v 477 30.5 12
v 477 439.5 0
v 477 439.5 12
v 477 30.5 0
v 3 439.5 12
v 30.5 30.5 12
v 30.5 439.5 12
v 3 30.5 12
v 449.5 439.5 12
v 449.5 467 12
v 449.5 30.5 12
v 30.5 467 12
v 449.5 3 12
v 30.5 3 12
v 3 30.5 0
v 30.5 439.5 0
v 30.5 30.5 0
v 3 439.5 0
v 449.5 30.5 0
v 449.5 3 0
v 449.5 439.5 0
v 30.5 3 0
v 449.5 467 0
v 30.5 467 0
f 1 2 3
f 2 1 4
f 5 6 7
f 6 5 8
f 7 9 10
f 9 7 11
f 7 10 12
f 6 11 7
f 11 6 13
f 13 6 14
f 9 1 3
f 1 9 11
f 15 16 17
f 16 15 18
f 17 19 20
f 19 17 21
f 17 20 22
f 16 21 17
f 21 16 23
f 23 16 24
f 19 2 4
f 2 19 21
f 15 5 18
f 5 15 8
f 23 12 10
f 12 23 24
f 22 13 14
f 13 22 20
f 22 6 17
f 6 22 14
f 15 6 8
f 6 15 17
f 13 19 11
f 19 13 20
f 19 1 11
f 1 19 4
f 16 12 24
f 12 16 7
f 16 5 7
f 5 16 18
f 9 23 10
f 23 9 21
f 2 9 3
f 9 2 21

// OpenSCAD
// file: ../imports/Chamfer.scad
/**
  *  The MIT License (MIT)
  *
  *  "Chamfers for OpenSCAD" v0.4 Copyright (c) 2016 SebiTimeWaster
  *
  *  Permission is hereby granted, free of charge, to any person obtaining a copy
  *  of this software and associated documentation files (the "Software"), to deal
  *  in the Software without restriction, including without limitation the rights
  *  to use, copy, modify, merge, publish, distribute, sublicense, and/or sell
  *  copies of the Software, and to permit persons to whom the Software is
  *  furnished to do so, subject to the following conditions:
  *
  *  The above copyright notice and this permission notice shall be included in all
  *  copies or substantial portions of the Software.
  *
  *  THE SOFTWARE IS PROVIDED "AS IS", WITHOUT WARRANTY OF ANY KIND, EXPRESS OR
  *  IMPLIED, INCLUDING BUT NOT LIMITED TO THE WARRANTIES OF MERCHANTABILITY,
  *  FITNESS FOR A PARTICULAR PURPOSE AND NONINFRINGEMENT. IN NO EVENT SHALL THE
  *  AUTHORS OR COPYRIGHT HOLDERS BE LIABLE FOR ANY CLAIM, DAMAGES OR OTHER
  *  LIABILITY, WHETHER IN AN ACTION OF CONTRACT, TORT OR OTHERWISE, ARISING FROM,
  *  OUT OF OR IN CONNECTION WITH THE SOFTWARE OR THE USE OR OTHER DEALINGS IN THE
  *  SOFTWARE.
  */

/**
  * chamferCube returns an cube with 45° chamfers on the edges of the
  * cube. The chamfers are diectly printable on Fused deposition
  * modelling (FDM) printers without support structures.
  *
  * @param  sizeX          The size of the cube along the x axis
  * @param  sizeY          The size of the cube along the y axis
  * @param  sizeZ          The size of the cube along the z axis
  * @param  chamferHeight  The "height" of the chamfers as seen from
  *                        one of the dimensional planes (The real
  *                        width is side c in a right angled triangle)
  * @param  chamferX       Which chamfers to render along the x axis
  *                        in clockwise order starting from the zero
  *                        point, as seen from "Left view" (Ctrl + 6)
  * @param  chamferY       Which chamfers to render along the y axis
  *                        in clockwise order starting from the zero
  *                        point, as seen from "Front view" (Ctrl + 8)
  * @param  chamferZ       Which chamfers to render along the z axis
  *                        in clockwise order starting from the zero
  *                        point, as seen from "Bottom view" (Ctrl + 5)
  */
module chamferCube(sizeX, sizeY, sizeZ, chamferHeight = 1, chamferX = [1, 1, 1, 1], chamferY = [1, 1, 1, 1], chamferZ = [1, 1, 1, 1]) {
    chamferCLength = sqrt(chamferHeight * chamferHeight * 2);
    difference() {
        cube([sizeX, sizeY, sizeZ]);
        for(x = [0 : 3]) {
            chamferSide1 = min(x, 1) - floor(x / 3); // 0 1 1 0
            chamferSide2 = floor(x / 2); // 0 0 1 1
            if(chamferX[x]) {
                translate([-0.1, chamferSide1 * sizeY, -chamferHeight + chamferSide2 * sizeZ])
                rotate([45, 0, 0])
                cube([sizeX + 0.2, chamferCLength, chamferCLength]);
            }
            if(chamferY[x]) {
                translate([-chamferHeight + chamferSide2 * sizeX, -0.1, chamferSide1 * sizeZ])
                rotate([0, 45, 0])
                cube([chamferCLength, sizeY + 0.2, chamferCLength]);
            }
            if(chamferZ[x]) {
                translate([chamferSide1 * sizeX, -chamferHeight + chamferSide2 * sizeY, -0.1])
                rotate([0, 0, 45])
                cube([chamferCLength, chamferCLength, sizeZ + 0.2]);
            }
        }
    }
}

/**
  * chamferCylinder returns an cylinder or cone with 45° chamfers on
  * the edges of the cylinder. The chamfers are diectly printable on
  * Fused deposition modelling (FDM) printers without support structures.
  *
  * @param  height         Height of the cylinder
  * @param  radius         Radius of the cylinder (At the bottom)
  * @param  radius2        Radius of the cylinder (At the top)
  * @param  chamferHeight  The "height" of the chamfer at radius 1 as
  *                        seen from one of the dimensional planes (The 
  *                        real width is side c in a right angled triangle)
  * @param  chamferHeight2 The "height" of the chamfer at radius 2 as
  *                        seen from one of the dimensional planes (The 
  *                        real width is side c in a right angled triangle)
  * @param  angle          The radius of the visible part of a wedge
  *                        starting from the x axis counter-clockwise
  * @param  quality        A circle quality factor where 1.0 is a fairly
  *                        good quality, range from 0.0 to 2.0
  */
module chamferCylinder(height, radius, radius2=undef, chamferHeight = 1, chamferHeight2=undef, angle = 0, quality = -1.0) {
    radius2 = (radius2 == undef) ? radius : radius2;
    chamferHeight2 = (chamferHeight2 == undef) ? chamferHeight : chamferHeight2;
    module cc() {
        if(chamferHeight2 != 0) {
            translate([0, 0, height - abs(chamferHeight2)]) cylinder(abs(chamferHeight2), r1 = radius2, r2 = radius2 - chamferHeight2, $fn = circleSegments(radius2, quality));
        }
        translate([0, 0, abs(chamferHeight)]) cylinder(height - abs(chamferHeight2) - abs(chamferHeight), r1 = radius, r2 = radius2, $fn = circleSegments(max(radius, radius2), quality));
        if(chamferHeight2 != 0) {
            cylinder(abs(chamferHeight), r1 = radius - chamferHeight, r2 = radius, $fn = circleSegments(radius, quality));
        }
    }
    module box(brim = abs(min(chamferHeight2, 0)) + 1) {
        translate([-radius - brim, 0, -brim]) cube([radius * 2 + brim * 2, radius + brim, height + brim * 2]);
    }
    module hcc() {
        intersection() {
            cc();
            box();
        }
    }
    if(angle <= 0 || angle >= 360) cc();
    else {
        if(angle > 180) hcc();
        difference() {
            if(angle <= 180) hcc();
            else rotate([0, 0, 180]) hcc();
            rotate([0, 0, angle]) box(abs(min(chamferHeight2, 0)) + radius);
        }
    }
}

/**
  * circleSegments calculates the number of segments needed to maintain
  * a constant circle quality.
  * If a globalSegementsQuality variable exist it will overwrite the
  * standard quality setting (1.0). Order of usage is:
  * Standard (1.0) <- globalCircleQuality <- Quality parameter
  *
  * @param  r        Radius of the circle
  * @param  quality  A quality factor, where 1.0 is a fairly good
  *                  quality, range from 0.0 to 2.0
  *
  * @return  The number of segments for the circle
  */
function circleSegments(r, quality = -1.0) = (r * PI * 4 + 40) * ((quality >= 0.0) ? quality : globalCircleQuality);

// set global quality to 1.0, can be overridden by user
globalCircleQuality = 1.0;
// file: ../util/util.scad
//*******************************************************************
// Utility modules and functions
//*******************************************************************

use <../imports/Chamfer.scad>

function nnv(v, d) = v != undef ? v : d;

module tr(t, r) {
	tr = t != undef ? [t.x, t.y, t.z] : [0, 0, 0];
	ro = r != undef ? [r.x, r.y, r.z] : (t != undef && len(t) > 3) ? [t[3], t[4], t[5]] : [0, 0, 0];
	translate(tr) rotate(ro) children();
}

module rt(t, r) {
	tr = t != undef ? [-t.x, -t.y, -t.z] : [0, 0, 0];
	ro = r != undef ? [-r.x, -r.y, -r.z] : (t != undef && len(t) > 3) ? [-t[3], -t[4], -t[5]] : [0, 0, 0];
	rotate([ro.x,0,0]) rotate([0,ro.y,0]) rotate([0,0,ro.z]) translate(tr) children();
}

function setz(xy, z) = [xy.x, xy.y, z];
function setzs(xys, z) = [for (xy = xys) setz(xy, z)];

module cubex(xyyz) {
	x = xyyz[0]; y1 = xyyz[1]; y2 = xyyz[2]; z = xyyz[3];
	mirror = y1 > y2 ? [1, 0, 0] : [0, 0, 0];
	translate = y1 > y2 ? [x, 0, 0] : [0, 0, 0];
	ymin = min(y1, y2); ymax = max(y1, y2);
	translate(translate) mirror(mirror) difference() {
		cube([x, ymax, z]);
		translate([-0.001, ymin, -1]) rotate([0, 0, atan((ymax-ymin)/x)]) cube([x*2, ymax, z+2]);
	}
}

module triangle(xyz) {
	cubex([xyz.x, xyz.y, 0, xyz.z]);
}
triangle([10, 6, 2]);

module ccylinder(h, r, c1h = 0, c2h = 0, a = 360) {
	//chamferCylinder(h, r, r, chamferHeight = c1h, chamferHeight2 = c2h);
	module cc() {
		if (c1h != 0) cylinder(abs(c1h)+0.001, r-c1h, r);
		translate([0, 0, abs(c1h)]) cylinder(h-abs(c1h)-abs(c2h), r, r);
		if (c2h != 0) translate([0, 0, h-abs(c2h)-0.001]) cylinder(abs(c2h)+0.001, r, r-c2h);
	}
	if (a >= 360 || a <= 0) {
		cc();
	} else {
		difference() {
			cc();
			translate([-r-1, -r-1, -1]) cube([r+1, r*2+2, h+2]);
			rotate([0, 0, -180+min(a, 180)]) translate([-r-1, -r-1, -1]) cube([r+1, r*2+2, h+2]);
		}
		if (a > 180) difference() {
			cc();
			translate([0, -r-1, -1]) cube([r+1, r*2+2, h+2]);
			rotate([0, 0, -360+a]) translate([0, -r-1, -1]) cube([r+1, r*2+2, h+2]);
		}
	}
}

module cpieQuater(h, r, c1h = 0, c2h = 0) {
	difference() {
		cube([r, r, h]);
		translate([-0.001, -0.001, -0.001]) ccylinder(h+0.002, r, c1h = c1h, c2h = c2h);
	}
}
//cpieQuater(20,6,-1,-1);


module ccube(x, y, z, ch = 0, sides = [1, 0, 0, 0], sides2 = [0, 0, 0, 0], sides3 = [0, 0, 0, 0]) {
	chamferCube(x, y, z, ch, sides, sides2, sides3);
}

module ccubeForCut(x, y, z, ch = 0) {
	difference() {
		translate([0, -ch+0.00001, -0.1]) cube([x, y+ch+0.00001, z+0.2]);
		translate([-0.2, -y, -0.2]) ccube(x+0.4, y, z+0.4, ch+0.2, [0, 0, 1, 0]);
	}
}
//ccubeForCut(40,30,5,2);

module ccubeHalf(x, y, z, ch = 0, sides = [0, 0, 0, 0], sides2 = [0, 0, 0, 0], sides3 = [0, 0, 0, 0]) {
	difference() {
		ccube(x, y, z, ch, [sides[0], 0, 0, sides[3]], sides2, sides3);
		rotate([0, 0, atan(y/x)]) translate([0, -y, 0])
			difference() {
				translate([0, y-ch, -0.001]) cube([x*2, y*2, z+0.002]);
				translate([0, 0, -0.001]) ccube(x*2, y, z+0.002, ch, [0, sides[1], sides[2], 0]);
			};
		//translate([10,0,-1]) //rotate([0,0,atan(y/x)]) {
	}
}

//ccubeHalf(6,3,4,0.5,[0,1,1,0],[0,0,0,0],[0,0,0,0]);

/*
This design and software is copyrighted, but is free for private, non-commercial use.

All copyrights for this software belongs to Jesper Lauritsen, Denmark, smoothieAq@gmail.com.
If you are a non-profit company, or use the software for personal use, you may enjoy the software
for free under a Creative Commons (CC) Attribution-NonCommercial licence 
	https://creativecommons.org/licenses/by-nc/3.0/
Please contact Jesper, if you need any other kind of license.
*/
// file: ../otherParts/stepperMotor.scad
//*******************************************************************
// Stepper motor
//*******************************************************************

include <../util/standardDefinitions.scad>
use <../util/util.scad>


length=1; width=2; champfer=3; screwType=4; screwHoleDist=5; shaftRadius=6; shaftLength=7; pilotRadius=8; pilotDepth=9; topThick=10; botThick=11;
nema14 = [0,40,35.56,3.50,m4,26.00,2.50,24.00,11.00,2.00,7.50,9.50];
nema17 = [0,40,43.18,4.00,m3,31.00,2.50,24.00,11.00,2.00,6.50,8.50];

function stepperMotor(std,length,shaftLength) = [std[0],length,std[2],std[3],std[4],std[5],std[6],shaftLength==undef?std[7]:shaftLength,std[8],std[9],std[10],std[11]];
function stepperHoleFromEdge(stepperMotor) = (stepperMotor[width]-stepperMotor[screwHoleDist])/2;


module theStepperMotor(stepperMotor,pulley=Gt2Timing20,pulleyH,color,aluColor) {
	translate([-stepperMotor[width]/2,-stepperMotor[width]/2,-stepperMotor[length]]) {
		color(aluColor)
			ccube(stepperMotor[width],stepperMotor[width],stepperMotor[botThick],stepperMotor[champfer],[0,0,0,0],[0,0,0,0],[1,1,1,1]);
		color(color)
			translate([0,0,stepperMotor[botThick]])
				ccube(stepperMotor[width],stepperMotor[width],stepperMotor[length]-stepperMotor[topThick]-stepperMotor[botThick],stepperMotor[champfer]*1.4,[0,0,0,0],[0,0,0,0],[1,1,1,1]);
		color(aluColor)
			translate([0,0,stepperMotor[length]-stepperMotor[topThick]])
				ccube(stepperMotor[width],stepperMotor[width],stepperMotor[topThick],stepperMotor[champfer],[0,0,0,0],[0,0,0,0],[1,1,1,1]);
	}
	color(aluColor) {
		cylinder(r=stepperMotor[pilotRadius],h=stepperMotor[pilotDepth]);
		cylinder(r=stepperMotor[shaftRadius],h=stepperMotor[shaftLength]);
		if (pulley != undef) translate([0,0,pulleyH==undef?stepperMotor[shaftLength]-idlerHeight(pulley):pulleyH]) thePulley(pulley);
	}
}

//theStepperMotor(stepperMotor(nema17,40),color=otherPartColor,aluColor=aluColor);


/*
This design and software is copyrighted, but is free for private, non-commercial use.

All copyrights for this software belongs to Jesper Lauritsen, Denmark, smoothieAq@gmail.com.
If you are a non-profit company, or use the software for personal use, you may enjoy the software
for free under a Creative Commons (CC) Attribution-NonCommercial licence 
	https://creativecommons.org/licenses/by-nc/3.0/
Please contact Jesper, if you need any other kind of license.
*/
// file: ../util/standardDefinitions.scad
//*******************************************************************
// standard constant elements and some utillity functions and modules
//*******************************************************************


use <util.scad>

// extrusions
exmainsq = 0; length = 1; excentersq = 2; excornersq = 3; exflangethick = 4; exflangelen = 5; exname = 6;
extrusion3030 = [30, -99, 11.64, (30-16.51)/2, 2.21, (30-8.13)/2-(30-16.51)/2, "3030"];

function extrusion(std, exLength) = [std[exmainsq], exLength, std[excentersq], std[excornersq], std[exflangethick], std[exflangelen], std[exname]];
function exMountScrewDepth(extrusion) = (extrusion[exmainsq]-extrusion[excentersq])/2-3;
module profile(mainsq, centersq, cornersq, flangethick, flangelen) {
    module corner() {
        square(cornersq);
        translate([cornersq, 0, 0])
            square([flangelen, flangethick]);
        translate([0, cornersq, 0])
            square([flangethick, flangelen]);
        rotate([0, 0, 45]) translate([cornersq/2, -flangethick/2, 0])
            square([mainsq/2-flangelen, flangethick]);
    }
    translate([mainsq/2, mainsq/2, 0]) {
        for (v = [0:90:360])
        rotate([0, 0, v]) translate([-mainsq/2, -mainsq/2, 0])
            corner();
        square(centersq, center = true);
    }
}
module theExtrusion(extrusion, leng) {linear_extrude(nnv(leng, extrusion[length])) profile(extrusion[exmainsq], extrusion[excentersq], extrusion[excornersq],
extrusion[exflangethick], extrusion[exflangelen]);}

// shafts: 
radius = 0; /*length=1;*/ bushingRadius = 2; bushingStdLength = 3;
shaft8 = [4, -99, 8.0, 25];
shaft10 = [5, -99, 9.5, 29];
shaft12 = [6, -99, 11.0, 32];

function shaft(std, shaftLength) = [std[0], shaftLength, std[2], std[3]];
module theShaft(shaft, leng) {len = leng > 0 ? leng : shaft[length]; translate([-len/2, 0, 0]) rotate([0, 90, 0]) cylinder(r = shaft[radius], h = len);}
module shaftHole(shaft, thick) { translate([0,0,-thick-1]) cylinder(r = shaft[radius], h=thick+2); }


// screws:
/*radius=0; length=1;*/ holeRadius = 2; headRadius = 3; headHoleRadius = 4; headHeight = 5;
nutWidth = 6; nutHoleWidth = 7; nutHoleRadius = 8;  nutHeight = 9; nutHoleHeight = 10; screwLengths = 11; screwName = 12;
m2 = [1.00, -99, 1.05, 1.50, 1.60, 2.00, 2.00, 2.05, 2.21, 1.60, 1.80, [3, 4, 5, 6, 8, 10, 12, 16, 20, 25, 30], "m2"];
m3 = [1.50, -99, 1.55, 2.50, 2.60, 3.00, 2.75, 2.80, 3.10, 2.40, 2.60, [3, 4, 5, 6, 8, 10, 12, 16, 20, 25, 30, 35, 40, 45, 50, 55, 60, 70, 80], "m3"];
m4 = [2.00, -99, 2.05, 3.00, 3.10, 4.00, 3.50, 3.55, 3.89, 3.20, 3.40, [3, 4, 5, 6, 8, 10, 12, 16, 20, 25, 30, 35, 40, 45, 50, 60, 70, 80, 90], "m4"];
m5 = [2.50, -99, 2.55, 4.00, 4.10, 5.00, 4.00, 4.05, 4.49, 4.70, 4.90, [5, 10, 12, 16, 20, 25, 30, 35, 40, 50, 60, 70, 80, 90], "m5"];

function screwMinLength(screw, minLength, depth, nutdepth) = echo(minLength=minLength,depth=depth,nutdepth=nutdepth)
    let (ml = minLength-nnv(depth, 0)*screw[headHeight]+(1-nnv(nutdepth, 1))*screw[nutHeight]) echo(ml=ml)
        screw(screw, [for (l = screw[screwLengths]) if ( l >= ml ) l][0]);
function screwMaxLength(screw, maxLength, depth, nutdepth) = //echo(maxLength=maxLength,depth=depth,nutdepth=nutdepth)
    let (ml = maxLength-nnv(depth, 0)*screw[headHeight]+(1-nnv(nutdepth, 1))*screw[nutHeight], mls = [for (l = screw[screwLengths]) if ( l < ml ) l]) //echo(ml=ml,mx=mls[len(mls)-1])
        screw(screw, mls[len(mls)-1]);
function screw(std, screwLength) = [std[0], screwLength, std[2], std[3], std[4], std[5], std[6], std[7], std[8], std[9], std[10], std[11], std[12]];
module hexaprism(r, h) {rotate([0, 0, 30]) cylinder(r = r*2/sqrt(3), h = h, $fn = 6);}
module nut(screw, depth = 0, twist = 0) {
    translate([0, 0, -depth*screw[nutHoleHeight]]) rotate([0, 0, twist]) {
        difference() {
            hexaprism(screw[nutWidth], screw[nutHeight]);
            translate([0, 0, screw[nutHeight]/2+0.1]) cylinder(r = screw[radius], h = screw[nutHeight]/2);
        }
    }
}
module nutHole(screw, depth = 1, twist = 0, spacing = undef) {
    spc = spacing != undef ? spacing : screw[nutHoleHeight];
    translate([0, 0, -depth*screw[nutHoleHeight]]) rotate([0, 0, twist])
        hexaprism(screw[nutHoleWidth], screw[nutHoleHeight]+spc);
}
module screwHole(screw, leng) {
    len = nnv(leng, screw[length]);
    translate([0, 0, -len-0.1]) cylinder(r = screw[holeRadius], h = len+0.2);
}
module screwHead(screw, depth = 0) {
    translate([0, 0, -depth*screw[headHeight]])
        difference() {
            ccylinder(r = screw[headRadius], h = screw[headHeight], c1h = screw[headRadius]/8, c2h = screw[headRadius]/8);
            translate([0, 0, screw[headHeight]/2+0.1]) hexaprism(r = screw[headRadius]/3, h = screw[headHeight]/2);
        }
}
module theScrew(screw, depth = 0, leng) {
    len = nnv(leng, screw[length]);
    screwHead(screw, depth = depth);
    translate([0, 0, -depth*screw[headHeight]-len]) cylinder(r = screw[radius], h = len);
}
module screwHeadHole(screw, depth = 1, spacing = 20) {
    translate([0, 0, -depth*screw[headHeight]])
        cylinder(r = screw[headHoleRadius], h = screw[headHeight]+spacing);
}
module screwAllHole(screw, leng, depth = 1, spacing = 20) {
    screwHole(screw, nnv(leng, screw[length])+depth*screw[headHeight]);
    screwHeadHole(screw, depth, spacing);
}


// timing belt
width = 2; thick = 3; toothHeight = 4; toothSpacing = 5; beltName = 6;
gt2 = [0, 0, 6, 1.38, 0.75, 2, "gt"];

function beltBaseThick(belt) = belt[thick]-belt[toothHeight];


// belt idler/timing pullys:
/*radius=0;*/ forBelt = 1; /*holeRadius=2;*/ toothed = 3; baseRadius = 4; flangeTopHeight = 5; flangeBotHeight = 6; flangeRadius = 7; pullyName = 8; forScrew = 9;
F623x2 = [5.00, gt2, 1.5, false, 5.00, 1.0, 1.0, 6.0, "F623 x 2", m3]; // two F633 against each other, use f633zz
Gt2Timing20 = [5.95, gt2, 2.5, true, 5.00, 1.1, 7.5, 8.0, "Gt2 timing 20", m5];
Gt2Idler20 = [5.95, gt2, 2.5, true, 5.00, 1.1, 1.1, 8.0, "Gt2 idler w/teeth 20", m5];
Gt2Idler20nt = [6.00, gt2, 2.5, false, 6.00, 1.1, 1.1, 8.0, "Gt2 idler wo/teeth 20", m5];

function idlerWidth(pulley) = pulley[forBelt][width];
function idlerHeight(pulley) = idlerWidth(pulley)+pulley[flangeBotHeight]+pulley[flangeTopHeight];
module thePulley(pulley) {
    difference() {
        union() {
            cylinder(r = pulley[baseRadius], h = idlerWidth(pulley)+pulley[flangeBotHeight]);
            cylinder(r = pulley[flangeRadius], h = pulley[flangeBotHeight]);
            translate([0, 0, idlerWidth(pulley)+pulley[flangeBotHeight]]) cylinder(r = pulley[flangeRadius], h = pulley[flangeTopHeight]);
        }
        translate([0, 0, -0.1]) cylinder(r = pulley[holeRadius], h = idlerHeight(pulley)+0.2);
    }

}

/*
This design and software is copyrighted, but is free for private, non-commercial use.

All copyrights for this software belongs to Jesper Lauritsen, Denmark, smoothieAq@gmail.com.
If you are a non-profit company, or use the software for personal use, you may enjoy the software
for free under a Creative Commons (CC) Attribution-NonCommercial licence 
	https://creativecommons.org/licenses/by-nc/3.0/
Please contact Jesper, if you need any other kind of license.
*/
// file: ../CEVOdefinitions.scad
//*******************************************************************
// Definition of basic sizings of the CEVO
//*******************************************************************

include <util/standardDefinitions.scad>
include <otherParts/stepperMotor.scad>
 

/////////////////////////////////////////////////////////////////////
// overall size and properties, review and override as you see fit

frameHeight				= 600;
frameWidth				= 480; // including 2 x extrusion with
frameDepth				= 470; // including 2 x extrusion with

plateThick				= 12;

hotbedWidth 			= 300;
hotbedDepth 			= 300;
printingHeight 			= 300;

carbonXshaft = true;
carbonYshaft = true;


/////////////////////////////////////////////////////////////////////
// additional properties, these have sensible defaults but can be overridden

allExtrusion			= extrusion3030;

xshaftLength			= frameWidth-2*allExtrusion[exmainsq]-10;
xshaft 					= shaft(hotbedWidth > 300 || carbonXshaft ? shaft10 : shaft8,xshaftLength);
xshaftDistance 			= 60;

yshaftLength			= frameDepth-40;
hotendOffset 			= [0,-6,0]; 		// carefull, should go with the carriage dimentions and your hotend mount

yshaft 					= shaft(hotbedDepth > 300 || carbonYshaft ? shaft12 : shaft10,yshaftLength);

belt 					= gt2;
defaultIdler			= F623x2;

beltStepperMotor		= stepperMotor(nema17,40);
beltStepperPulley		= Gt2Timing20;


/////////////////////////////////////////////////////////////////////
// smaller generic elements, most can be tweaked a bit, but be aware they influence most parts

beltCarriageDistance	= belt[thick]+5;

idlerSpacer = 0.8;
printIdlerSpacer = false;

partMountingThick = 5;
partMountingExWidth = allExtrusion[exmainsq]/5*4.2;
partMountingExExWidth = allExtrusion[exmainsq]/5*3.4;
screwDepth = 0.2; // fraction of headHeight
partMountingScrew = m3;
frameMountingScrew = m4;

bushingWall = 3;
bushingTap = 1.5;
screwTapMinThick = 1.4;
screwTapThick = 2.0;
screwTapSolidThick = 4;

bevelHeight = 0.6;
bevelWidth = 2.0;
diamantLength = 5;
diamantWidth = 2.5;
diamantSpacing = 0.2;
chamfer = 1.5;

slack = 0.2;
assembleSlack = 0.025;


/////////////////////////////////////////////////////////////////////
// calculated helpers, don't change

extrusionWidth 	= allExtrusion[exmainsq];

yIdlerDist		= yshaft[bushingRadius] + bushingWall; // X-dist relative to yshaft center


/////////////////////////////////////////////////////////////////////
// colors, only used to render nice looking visuals of the parts and assemblies

mainColor 		= [66/256,78/256,78/256,1]; // dark greyish
accentColor 	= [200/256,1/256,1/256,1]; // Red
screwColor 		= [80/256,80/256,80/256,1]; // little less dark grey
frameColor 		= [75/256,78/256,78/256,1]; // less dark greyish
aluColor 		= [220/256,220/256,220/256,1]; // light grey
carbonColor		= [55/256,55/256,55/256,1]; // dark grey
otherPartColor	= [50/256,50/256,50/256,1]; // more dark greyish


/////////////////////////////////////////////////////////////////////
// rendering diamants are real slow, override these when testing

doDiamants 			= true;
doRealDiamants 		= false;


/////////////////////////////////////////////////////////////////////
// probably don't change these

$fs=0.2;
$fa=2;
$fn=undef;


/*
This design and software is copyrighted, but is free for private, non-commercial use.

All copyrights for this software belongs to Jesper Lauritsen, Denmark, smoothieAq@gmail.com.
If you are a non-profit company, or use the software for personal use, you may enjoy the software
for free under a Creative Commons (CC) Attribution-NonCommercial licence 
	https://creativecommons.org/licenses/by-nc/3.0/
Please contact Jesper, if you need any other kind of license.
*/
// file: frameDefinitions.scad
//*******************************************************************
// Definition of frame sizings
//*******************************************************************

include <../CEVOdefinitions.scad>


/////////////////////////////////////////////////////////////////////
// main properties, these have sensible defaults but can be tweaked

topBrace 		= frameHeight-100;
botBrace 		= 150;
plateSpacing	= 10;


/////////////////////////////////////////////////////////////////////
// helpers, don't change

// we have three different lenghts of extrusion
exLength 		= frameHeight;
exWidth 		= frameWidth-2*extrusionWidth;
exDepth 		= frameDepth-2*extrusionWidth;
	
// these are the three kinds of extrusions
extrusionH 		= extrusion(allExtrusion,exLength);
extrusionW 		= extrusion(allExtrusion,exWidth);
extrusionD 		= extrusion(allExtrusion,exDepth);


/*
This design and software is copyrighted, but is free for private, non-commercial use.

All copyrights for this software belongs to Jesper Lauritsen, Denmark, smoothieAq@gmail.com.
If you are a non-profit company, or use the software for personal use, you may enjoy the software
for free under a Creative Commons (CC) Attribution-NonCommercial licence 
	https://creativecommons.org/licenses/by-nc/3.0/
Please contact Jesper, if you need any other kind of license.
*/
// main file
//*******************************************************************
// The plate for electronics at the bottom of the frame
//*******************************************************************

include <frameDefinitions.scad>


module bottomPlate(color=undef) {

	indent = 3;
	nudge = slack*2.5;
	cut = extrusionWidth-indent+nudge;
	
	width = frameWidth-2*indent;
	depth = frameDepth-2*indent;
		
	color(color) {
		
		difference() {
			translate([indent,indent,0]) cube([width,depth,plateThick]);
			translate([indent-1,indent-1,-1]) cube([cut+1,cut+1,plateThick+2]);
			translate([width-cut+indent,indent-1,-1]) cube([cut+1,cut+1,plateThick+2]);
			translate([indent-1,depth-cut+indent,-1]) cube([cut+1,cut+1,plateThick+2]);
			translate([width-cut+indent,depth-cut+indent,-1]) cube([cut+1,cut+1,plateThick+2]);
		}
	}
}

bottomPlate();

/*
This design and software is copyrighted, but is free for private, non-commercial use.

All copyrights for this software belongs to Jesper Lauritsen, Denmark, smoothieAq@gmail.com.
If you are a non-profit company, or use the software for personal use, you may enjoy the software
for free under a Creative Commons (CC) Attribution-NonCommercial licence 
	https://creativecommons.org/licenses/by-nc/3.0/
Please contact Jesper, if you need any other kind of license.
*/
